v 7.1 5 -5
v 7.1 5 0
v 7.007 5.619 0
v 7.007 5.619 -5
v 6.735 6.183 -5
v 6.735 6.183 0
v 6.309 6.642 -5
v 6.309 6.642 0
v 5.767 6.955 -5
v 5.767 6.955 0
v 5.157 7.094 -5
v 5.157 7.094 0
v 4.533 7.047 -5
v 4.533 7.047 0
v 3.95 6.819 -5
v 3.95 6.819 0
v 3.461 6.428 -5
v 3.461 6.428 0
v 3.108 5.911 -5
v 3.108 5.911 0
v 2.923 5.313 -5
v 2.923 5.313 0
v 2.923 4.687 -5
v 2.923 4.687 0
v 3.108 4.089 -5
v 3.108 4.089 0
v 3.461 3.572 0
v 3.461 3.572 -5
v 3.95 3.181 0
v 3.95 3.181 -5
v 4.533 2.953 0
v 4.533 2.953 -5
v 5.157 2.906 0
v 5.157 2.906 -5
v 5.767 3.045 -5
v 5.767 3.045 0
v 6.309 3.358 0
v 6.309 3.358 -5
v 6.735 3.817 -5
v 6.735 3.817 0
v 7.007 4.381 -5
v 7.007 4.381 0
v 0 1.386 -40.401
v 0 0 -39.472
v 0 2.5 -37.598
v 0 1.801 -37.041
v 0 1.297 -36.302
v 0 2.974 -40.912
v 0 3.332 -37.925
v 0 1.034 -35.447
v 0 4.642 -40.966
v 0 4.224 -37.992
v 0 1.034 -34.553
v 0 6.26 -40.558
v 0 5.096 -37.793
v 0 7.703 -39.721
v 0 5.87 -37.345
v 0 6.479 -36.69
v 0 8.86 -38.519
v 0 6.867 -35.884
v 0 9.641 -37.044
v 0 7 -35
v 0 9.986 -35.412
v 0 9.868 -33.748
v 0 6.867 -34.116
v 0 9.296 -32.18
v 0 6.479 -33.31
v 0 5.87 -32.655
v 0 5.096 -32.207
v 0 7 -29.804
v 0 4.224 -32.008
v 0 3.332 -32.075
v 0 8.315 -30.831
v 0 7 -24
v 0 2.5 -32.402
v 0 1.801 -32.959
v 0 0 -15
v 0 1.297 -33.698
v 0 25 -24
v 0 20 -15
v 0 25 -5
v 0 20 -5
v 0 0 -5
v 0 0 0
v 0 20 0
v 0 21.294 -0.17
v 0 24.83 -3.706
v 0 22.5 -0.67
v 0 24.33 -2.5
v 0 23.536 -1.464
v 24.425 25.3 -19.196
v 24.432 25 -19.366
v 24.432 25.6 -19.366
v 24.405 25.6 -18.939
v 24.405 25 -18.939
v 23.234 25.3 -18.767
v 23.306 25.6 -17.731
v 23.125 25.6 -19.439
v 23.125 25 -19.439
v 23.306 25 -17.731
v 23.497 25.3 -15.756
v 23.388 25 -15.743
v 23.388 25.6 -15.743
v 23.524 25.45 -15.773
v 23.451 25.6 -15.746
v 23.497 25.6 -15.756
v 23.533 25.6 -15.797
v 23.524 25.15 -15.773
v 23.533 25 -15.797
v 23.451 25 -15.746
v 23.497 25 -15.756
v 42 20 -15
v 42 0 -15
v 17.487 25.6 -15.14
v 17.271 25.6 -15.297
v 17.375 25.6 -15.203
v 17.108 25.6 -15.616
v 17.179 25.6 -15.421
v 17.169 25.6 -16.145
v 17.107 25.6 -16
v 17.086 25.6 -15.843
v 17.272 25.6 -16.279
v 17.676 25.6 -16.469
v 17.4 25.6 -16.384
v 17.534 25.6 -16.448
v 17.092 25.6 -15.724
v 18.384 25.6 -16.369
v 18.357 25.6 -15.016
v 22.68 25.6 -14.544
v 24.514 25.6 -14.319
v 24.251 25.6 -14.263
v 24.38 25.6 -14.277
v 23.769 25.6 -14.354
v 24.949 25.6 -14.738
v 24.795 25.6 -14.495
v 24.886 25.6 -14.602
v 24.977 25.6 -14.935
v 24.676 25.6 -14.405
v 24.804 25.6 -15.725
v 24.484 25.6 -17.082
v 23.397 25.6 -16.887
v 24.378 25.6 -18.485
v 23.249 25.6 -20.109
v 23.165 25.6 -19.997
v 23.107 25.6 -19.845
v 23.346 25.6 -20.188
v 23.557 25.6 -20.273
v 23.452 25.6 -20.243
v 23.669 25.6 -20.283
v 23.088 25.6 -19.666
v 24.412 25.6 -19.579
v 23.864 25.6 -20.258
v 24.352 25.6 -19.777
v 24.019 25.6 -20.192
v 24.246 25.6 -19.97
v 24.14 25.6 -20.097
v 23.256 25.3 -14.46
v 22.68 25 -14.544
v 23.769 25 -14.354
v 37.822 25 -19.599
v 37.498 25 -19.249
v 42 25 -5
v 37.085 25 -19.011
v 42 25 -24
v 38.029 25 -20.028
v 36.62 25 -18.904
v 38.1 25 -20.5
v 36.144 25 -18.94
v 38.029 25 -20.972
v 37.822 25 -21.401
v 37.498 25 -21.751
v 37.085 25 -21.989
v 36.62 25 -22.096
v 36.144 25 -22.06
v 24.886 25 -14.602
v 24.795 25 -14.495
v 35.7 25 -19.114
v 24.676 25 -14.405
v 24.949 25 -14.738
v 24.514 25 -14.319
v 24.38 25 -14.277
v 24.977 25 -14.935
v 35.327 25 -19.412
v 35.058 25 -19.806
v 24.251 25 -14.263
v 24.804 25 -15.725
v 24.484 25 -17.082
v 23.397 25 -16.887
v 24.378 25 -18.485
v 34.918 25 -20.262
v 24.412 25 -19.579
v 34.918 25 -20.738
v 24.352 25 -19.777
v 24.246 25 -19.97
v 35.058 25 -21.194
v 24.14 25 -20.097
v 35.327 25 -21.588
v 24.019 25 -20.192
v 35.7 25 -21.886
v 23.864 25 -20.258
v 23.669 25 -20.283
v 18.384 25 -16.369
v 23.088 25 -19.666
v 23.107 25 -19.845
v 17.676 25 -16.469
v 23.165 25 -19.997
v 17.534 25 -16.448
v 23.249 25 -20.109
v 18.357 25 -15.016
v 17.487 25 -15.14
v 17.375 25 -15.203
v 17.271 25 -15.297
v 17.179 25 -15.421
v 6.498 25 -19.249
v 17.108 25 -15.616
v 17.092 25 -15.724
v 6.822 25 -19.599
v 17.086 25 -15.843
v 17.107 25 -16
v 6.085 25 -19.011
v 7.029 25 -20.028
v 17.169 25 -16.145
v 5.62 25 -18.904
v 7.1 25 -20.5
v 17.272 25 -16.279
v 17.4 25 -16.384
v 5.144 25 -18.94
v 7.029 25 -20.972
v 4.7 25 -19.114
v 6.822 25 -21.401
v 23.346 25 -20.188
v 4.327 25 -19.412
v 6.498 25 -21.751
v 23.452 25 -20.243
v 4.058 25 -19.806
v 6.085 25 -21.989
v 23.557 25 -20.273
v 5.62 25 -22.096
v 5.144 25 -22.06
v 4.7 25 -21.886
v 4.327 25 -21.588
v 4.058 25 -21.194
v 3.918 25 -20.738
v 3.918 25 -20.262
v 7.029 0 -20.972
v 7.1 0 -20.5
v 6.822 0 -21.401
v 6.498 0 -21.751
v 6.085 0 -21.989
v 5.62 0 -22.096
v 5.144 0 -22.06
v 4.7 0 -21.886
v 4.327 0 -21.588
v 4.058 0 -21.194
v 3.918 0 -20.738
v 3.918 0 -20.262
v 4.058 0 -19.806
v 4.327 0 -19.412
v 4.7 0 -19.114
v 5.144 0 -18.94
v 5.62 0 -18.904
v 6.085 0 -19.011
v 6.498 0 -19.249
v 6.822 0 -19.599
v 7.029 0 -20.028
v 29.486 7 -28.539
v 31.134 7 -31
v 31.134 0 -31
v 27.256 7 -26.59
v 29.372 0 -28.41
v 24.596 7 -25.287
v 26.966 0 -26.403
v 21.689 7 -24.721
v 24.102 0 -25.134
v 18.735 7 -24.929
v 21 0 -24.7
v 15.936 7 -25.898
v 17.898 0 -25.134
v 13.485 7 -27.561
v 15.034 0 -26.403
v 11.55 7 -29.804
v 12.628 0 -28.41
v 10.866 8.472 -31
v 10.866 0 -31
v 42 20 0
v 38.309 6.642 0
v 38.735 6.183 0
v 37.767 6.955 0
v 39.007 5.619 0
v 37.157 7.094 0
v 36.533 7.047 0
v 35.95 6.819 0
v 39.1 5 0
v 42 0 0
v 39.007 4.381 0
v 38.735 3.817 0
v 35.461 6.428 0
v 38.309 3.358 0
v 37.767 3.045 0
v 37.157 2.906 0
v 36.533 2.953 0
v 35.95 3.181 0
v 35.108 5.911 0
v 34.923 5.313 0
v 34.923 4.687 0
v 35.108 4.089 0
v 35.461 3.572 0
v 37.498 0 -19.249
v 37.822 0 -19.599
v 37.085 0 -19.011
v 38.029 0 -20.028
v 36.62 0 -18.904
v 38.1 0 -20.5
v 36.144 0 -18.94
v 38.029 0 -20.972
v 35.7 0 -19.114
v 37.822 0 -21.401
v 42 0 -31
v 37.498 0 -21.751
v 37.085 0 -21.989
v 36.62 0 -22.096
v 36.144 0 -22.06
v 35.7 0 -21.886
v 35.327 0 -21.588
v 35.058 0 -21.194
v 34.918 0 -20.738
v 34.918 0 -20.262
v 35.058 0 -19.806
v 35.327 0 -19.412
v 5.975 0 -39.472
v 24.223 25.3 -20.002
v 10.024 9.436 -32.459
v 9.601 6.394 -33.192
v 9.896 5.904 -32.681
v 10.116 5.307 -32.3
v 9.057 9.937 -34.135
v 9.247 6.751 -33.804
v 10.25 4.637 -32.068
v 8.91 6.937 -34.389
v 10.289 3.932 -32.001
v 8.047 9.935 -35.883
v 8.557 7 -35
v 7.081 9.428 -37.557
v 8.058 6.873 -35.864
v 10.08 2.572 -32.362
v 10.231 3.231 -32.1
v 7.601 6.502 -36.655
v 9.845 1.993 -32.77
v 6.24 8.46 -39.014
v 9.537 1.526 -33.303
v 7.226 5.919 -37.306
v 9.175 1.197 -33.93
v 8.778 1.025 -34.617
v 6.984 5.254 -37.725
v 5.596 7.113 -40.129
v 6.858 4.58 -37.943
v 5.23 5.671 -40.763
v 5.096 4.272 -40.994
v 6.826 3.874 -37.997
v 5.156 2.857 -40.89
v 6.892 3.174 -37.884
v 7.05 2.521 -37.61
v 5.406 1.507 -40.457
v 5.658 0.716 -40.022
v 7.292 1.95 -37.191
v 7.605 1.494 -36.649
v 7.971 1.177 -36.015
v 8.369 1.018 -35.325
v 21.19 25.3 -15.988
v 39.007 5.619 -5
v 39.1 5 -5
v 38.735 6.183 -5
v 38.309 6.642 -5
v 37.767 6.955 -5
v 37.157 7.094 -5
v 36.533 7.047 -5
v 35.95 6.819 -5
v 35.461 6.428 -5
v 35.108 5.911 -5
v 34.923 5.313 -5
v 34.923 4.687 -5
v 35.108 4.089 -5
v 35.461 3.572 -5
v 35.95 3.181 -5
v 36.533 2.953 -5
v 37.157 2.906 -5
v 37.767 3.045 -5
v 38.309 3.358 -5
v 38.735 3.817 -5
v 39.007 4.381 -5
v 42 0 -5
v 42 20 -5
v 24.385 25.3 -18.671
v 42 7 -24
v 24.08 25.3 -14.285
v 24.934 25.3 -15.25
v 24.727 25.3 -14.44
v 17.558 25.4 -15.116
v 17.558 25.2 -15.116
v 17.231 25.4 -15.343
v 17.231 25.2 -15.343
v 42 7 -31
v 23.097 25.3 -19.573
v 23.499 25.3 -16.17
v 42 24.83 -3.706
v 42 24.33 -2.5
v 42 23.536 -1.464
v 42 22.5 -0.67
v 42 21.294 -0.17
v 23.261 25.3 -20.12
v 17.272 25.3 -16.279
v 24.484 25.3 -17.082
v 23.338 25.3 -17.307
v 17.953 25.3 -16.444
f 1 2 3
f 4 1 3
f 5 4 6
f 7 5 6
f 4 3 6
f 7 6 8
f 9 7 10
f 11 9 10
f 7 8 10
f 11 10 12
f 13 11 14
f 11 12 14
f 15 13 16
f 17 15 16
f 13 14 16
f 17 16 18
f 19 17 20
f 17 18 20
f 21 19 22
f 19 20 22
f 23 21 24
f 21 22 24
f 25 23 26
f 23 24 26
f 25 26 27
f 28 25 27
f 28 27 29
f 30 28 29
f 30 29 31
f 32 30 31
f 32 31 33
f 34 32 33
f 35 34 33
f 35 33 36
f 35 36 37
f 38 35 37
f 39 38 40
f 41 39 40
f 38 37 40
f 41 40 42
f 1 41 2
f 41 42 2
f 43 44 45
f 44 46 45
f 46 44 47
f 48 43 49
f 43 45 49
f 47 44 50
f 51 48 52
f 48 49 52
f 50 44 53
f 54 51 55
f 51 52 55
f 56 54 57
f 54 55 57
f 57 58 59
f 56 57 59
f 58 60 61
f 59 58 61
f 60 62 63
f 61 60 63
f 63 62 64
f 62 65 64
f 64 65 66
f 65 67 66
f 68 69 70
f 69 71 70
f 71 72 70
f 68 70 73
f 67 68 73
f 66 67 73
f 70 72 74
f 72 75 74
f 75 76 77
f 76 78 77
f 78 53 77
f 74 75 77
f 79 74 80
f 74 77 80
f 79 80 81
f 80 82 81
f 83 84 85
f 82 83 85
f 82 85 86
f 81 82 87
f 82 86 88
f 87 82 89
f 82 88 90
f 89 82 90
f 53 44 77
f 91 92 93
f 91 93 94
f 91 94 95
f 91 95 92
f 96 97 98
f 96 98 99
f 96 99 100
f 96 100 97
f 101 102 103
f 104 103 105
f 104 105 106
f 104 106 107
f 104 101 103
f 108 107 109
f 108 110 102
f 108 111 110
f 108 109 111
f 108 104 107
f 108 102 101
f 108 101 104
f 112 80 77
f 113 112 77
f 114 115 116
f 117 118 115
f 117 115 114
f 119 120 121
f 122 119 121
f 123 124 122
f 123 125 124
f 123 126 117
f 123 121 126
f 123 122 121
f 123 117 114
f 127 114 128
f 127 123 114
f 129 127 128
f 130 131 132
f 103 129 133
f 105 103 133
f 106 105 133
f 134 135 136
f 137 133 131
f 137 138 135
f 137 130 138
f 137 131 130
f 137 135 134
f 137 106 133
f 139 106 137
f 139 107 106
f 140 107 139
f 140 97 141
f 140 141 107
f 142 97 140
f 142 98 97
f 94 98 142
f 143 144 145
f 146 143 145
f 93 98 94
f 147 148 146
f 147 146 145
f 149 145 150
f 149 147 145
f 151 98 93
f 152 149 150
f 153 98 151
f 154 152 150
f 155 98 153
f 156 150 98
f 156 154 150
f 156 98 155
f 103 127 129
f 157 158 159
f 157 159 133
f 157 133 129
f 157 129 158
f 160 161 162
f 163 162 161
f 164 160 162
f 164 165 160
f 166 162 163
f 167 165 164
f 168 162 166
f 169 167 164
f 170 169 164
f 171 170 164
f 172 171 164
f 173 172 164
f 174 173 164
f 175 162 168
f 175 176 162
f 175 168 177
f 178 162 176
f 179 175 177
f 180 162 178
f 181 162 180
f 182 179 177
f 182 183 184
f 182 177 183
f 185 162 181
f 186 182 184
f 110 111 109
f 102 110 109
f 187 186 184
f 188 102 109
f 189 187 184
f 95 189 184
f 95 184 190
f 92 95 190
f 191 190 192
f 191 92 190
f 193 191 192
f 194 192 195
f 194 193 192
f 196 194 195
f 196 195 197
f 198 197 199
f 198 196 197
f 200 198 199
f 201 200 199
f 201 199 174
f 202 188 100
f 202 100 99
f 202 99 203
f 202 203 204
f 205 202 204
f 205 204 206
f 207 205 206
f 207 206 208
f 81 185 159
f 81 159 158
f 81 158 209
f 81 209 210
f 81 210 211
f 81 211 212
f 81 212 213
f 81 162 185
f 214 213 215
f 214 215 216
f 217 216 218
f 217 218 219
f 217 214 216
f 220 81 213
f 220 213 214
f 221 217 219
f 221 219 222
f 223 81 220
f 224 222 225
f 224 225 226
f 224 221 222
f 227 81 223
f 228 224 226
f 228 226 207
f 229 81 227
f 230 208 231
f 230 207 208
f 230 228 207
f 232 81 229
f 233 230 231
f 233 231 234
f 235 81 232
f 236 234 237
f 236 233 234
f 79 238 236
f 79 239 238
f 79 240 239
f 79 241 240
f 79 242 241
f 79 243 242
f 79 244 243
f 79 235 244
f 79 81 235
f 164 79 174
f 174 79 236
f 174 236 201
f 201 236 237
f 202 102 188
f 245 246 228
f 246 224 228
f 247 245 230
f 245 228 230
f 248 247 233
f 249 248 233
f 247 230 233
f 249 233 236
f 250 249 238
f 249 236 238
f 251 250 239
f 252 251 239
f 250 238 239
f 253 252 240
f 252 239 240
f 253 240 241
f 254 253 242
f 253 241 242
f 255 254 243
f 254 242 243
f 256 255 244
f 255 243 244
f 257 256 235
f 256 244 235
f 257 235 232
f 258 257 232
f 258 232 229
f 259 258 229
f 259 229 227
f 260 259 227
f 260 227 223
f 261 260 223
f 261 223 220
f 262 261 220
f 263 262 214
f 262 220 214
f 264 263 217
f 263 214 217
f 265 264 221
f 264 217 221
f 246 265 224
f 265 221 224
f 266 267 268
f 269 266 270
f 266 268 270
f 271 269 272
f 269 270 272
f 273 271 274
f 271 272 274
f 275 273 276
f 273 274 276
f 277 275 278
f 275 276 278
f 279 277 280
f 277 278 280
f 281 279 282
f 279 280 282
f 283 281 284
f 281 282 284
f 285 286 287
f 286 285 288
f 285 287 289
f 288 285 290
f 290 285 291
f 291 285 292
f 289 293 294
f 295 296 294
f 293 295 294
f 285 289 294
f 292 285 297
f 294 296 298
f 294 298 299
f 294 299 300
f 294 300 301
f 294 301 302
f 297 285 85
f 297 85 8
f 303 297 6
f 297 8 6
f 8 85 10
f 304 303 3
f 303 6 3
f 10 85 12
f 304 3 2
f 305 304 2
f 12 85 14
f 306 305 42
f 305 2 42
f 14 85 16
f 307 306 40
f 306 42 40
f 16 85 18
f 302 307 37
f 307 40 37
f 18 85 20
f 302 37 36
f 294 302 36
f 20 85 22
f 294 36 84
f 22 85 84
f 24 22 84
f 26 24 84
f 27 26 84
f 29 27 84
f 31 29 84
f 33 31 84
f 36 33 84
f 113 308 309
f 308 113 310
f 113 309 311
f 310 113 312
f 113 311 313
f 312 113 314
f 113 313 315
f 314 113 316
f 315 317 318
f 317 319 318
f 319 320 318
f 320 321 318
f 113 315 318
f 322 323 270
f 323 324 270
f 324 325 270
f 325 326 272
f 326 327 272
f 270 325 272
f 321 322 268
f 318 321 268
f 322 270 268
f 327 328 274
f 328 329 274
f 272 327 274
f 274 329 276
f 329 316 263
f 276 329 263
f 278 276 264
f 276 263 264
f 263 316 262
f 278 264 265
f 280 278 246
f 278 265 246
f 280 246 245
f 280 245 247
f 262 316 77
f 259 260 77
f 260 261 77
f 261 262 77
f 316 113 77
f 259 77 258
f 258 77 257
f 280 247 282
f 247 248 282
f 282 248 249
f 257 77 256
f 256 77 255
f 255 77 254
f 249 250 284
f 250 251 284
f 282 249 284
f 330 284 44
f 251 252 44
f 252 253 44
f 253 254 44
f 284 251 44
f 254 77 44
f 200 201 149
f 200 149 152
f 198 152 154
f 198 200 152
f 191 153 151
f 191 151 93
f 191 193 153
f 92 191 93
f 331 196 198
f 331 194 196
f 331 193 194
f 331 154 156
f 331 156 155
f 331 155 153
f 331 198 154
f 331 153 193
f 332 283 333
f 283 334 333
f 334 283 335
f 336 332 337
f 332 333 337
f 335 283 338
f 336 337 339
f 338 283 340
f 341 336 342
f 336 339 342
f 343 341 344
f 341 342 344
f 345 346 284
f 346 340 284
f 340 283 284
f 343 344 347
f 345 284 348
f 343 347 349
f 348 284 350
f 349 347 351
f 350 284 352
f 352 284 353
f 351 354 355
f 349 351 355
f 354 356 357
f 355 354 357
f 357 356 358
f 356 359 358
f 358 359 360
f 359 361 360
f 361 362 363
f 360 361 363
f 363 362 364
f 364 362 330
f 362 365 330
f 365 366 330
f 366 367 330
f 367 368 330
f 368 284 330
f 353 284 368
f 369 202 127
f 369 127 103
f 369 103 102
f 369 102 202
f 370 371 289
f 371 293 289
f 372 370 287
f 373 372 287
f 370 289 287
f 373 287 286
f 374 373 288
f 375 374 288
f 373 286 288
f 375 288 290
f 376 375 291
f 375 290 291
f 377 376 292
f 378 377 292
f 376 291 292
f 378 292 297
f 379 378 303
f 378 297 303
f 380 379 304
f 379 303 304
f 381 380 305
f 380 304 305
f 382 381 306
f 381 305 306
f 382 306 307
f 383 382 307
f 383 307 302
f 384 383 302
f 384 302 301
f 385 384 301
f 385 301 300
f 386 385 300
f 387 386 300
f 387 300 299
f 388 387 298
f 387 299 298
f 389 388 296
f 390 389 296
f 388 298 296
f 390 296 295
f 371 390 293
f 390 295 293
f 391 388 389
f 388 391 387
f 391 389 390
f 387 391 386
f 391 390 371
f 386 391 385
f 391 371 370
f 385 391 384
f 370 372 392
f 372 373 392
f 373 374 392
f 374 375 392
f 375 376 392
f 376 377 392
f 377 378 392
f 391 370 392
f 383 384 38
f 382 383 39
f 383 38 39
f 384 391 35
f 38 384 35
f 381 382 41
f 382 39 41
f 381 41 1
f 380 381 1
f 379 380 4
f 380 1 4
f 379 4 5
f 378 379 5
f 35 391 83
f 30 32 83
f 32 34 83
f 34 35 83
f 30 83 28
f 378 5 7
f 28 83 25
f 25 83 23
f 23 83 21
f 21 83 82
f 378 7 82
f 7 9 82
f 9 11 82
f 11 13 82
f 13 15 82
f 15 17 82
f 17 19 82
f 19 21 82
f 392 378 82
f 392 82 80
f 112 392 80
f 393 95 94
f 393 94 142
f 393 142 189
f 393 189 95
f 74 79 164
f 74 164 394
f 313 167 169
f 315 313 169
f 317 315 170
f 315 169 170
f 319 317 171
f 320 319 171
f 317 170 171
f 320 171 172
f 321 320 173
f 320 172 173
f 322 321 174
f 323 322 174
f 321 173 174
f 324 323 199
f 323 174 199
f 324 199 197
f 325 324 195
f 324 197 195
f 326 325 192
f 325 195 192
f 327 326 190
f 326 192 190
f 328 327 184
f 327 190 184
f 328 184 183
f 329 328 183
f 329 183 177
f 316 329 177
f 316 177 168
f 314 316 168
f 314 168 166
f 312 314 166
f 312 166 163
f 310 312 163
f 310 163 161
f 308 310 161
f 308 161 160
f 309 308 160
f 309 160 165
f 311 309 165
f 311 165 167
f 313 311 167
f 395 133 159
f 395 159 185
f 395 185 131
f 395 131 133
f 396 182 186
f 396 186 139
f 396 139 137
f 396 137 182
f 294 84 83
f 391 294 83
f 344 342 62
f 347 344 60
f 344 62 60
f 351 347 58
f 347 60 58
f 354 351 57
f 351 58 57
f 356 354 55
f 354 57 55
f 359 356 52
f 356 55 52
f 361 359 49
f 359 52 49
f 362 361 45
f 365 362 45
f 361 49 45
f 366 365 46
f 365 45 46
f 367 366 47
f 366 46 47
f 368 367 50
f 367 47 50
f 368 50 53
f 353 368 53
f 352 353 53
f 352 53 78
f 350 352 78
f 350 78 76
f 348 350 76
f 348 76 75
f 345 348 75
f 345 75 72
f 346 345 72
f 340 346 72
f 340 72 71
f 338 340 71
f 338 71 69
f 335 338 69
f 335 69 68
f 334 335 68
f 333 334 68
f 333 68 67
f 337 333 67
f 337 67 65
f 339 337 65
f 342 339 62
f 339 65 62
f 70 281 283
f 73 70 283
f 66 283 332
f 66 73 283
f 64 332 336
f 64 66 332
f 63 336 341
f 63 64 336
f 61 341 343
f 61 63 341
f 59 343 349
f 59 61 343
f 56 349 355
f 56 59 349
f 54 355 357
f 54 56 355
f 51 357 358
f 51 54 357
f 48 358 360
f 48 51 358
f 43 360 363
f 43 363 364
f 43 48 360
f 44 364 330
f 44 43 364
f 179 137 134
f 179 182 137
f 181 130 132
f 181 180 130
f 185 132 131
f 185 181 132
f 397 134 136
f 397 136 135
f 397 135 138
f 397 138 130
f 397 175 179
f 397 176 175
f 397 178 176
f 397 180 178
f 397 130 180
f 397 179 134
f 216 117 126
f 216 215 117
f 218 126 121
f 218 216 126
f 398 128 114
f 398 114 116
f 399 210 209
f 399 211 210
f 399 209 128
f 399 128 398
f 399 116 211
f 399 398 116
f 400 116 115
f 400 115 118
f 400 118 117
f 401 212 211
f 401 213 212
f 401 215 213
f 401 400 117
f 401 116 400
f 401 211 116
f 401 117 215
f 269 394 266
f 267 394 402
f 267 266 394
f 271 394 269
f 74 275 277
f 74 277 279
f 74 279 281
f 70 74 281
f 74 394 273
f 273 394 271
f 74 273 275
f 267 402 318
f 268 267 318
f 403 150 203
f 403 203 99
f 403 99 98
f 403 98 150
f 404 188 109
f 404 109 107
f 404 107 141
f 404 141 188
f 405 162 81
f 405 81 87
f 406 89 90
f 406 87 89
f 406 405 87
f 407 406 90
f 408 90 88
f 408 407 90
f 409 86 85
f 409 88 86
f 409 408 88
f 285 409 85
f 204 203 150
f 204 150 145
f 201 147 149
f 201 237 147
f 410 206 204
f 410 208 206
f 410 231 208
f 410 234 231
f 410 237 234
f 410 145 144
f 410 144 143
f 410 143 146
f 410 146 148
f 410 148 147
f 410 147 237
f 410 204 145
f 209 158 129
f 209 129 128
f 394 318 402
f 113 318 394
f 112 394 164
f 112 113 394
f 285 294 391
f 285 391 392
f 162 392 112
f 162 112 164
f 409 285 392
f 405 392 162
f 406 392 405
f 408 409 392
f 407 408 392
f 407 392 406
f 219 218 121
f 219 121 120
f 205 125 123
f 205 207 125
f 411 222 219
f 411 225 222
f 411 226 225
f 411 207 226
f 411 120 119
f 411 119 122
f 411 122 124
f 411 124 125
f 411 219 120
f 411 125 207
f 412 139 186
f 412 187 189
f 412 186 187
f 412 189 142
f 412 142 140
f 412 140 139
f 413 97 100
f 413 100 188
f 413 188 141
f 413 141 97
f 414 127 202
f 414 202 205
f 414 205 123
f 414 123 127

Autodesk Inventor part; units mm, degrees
ref_plane "YZ Plane" through (0, 0, 0) normal (1, 0, 0) x (0, 1, 0)
ref_plane "XZ Plane" through (0, 0, 0) normal (0, 1, 0) x (-1, 0, 0)
ref_plane "XY Plane" through (0, 0, 0) normal (0, 0, 1) x (1, 0, 0)
sketch "Sketch1" plane through (0, 0, 0) normal (1, 0, 0) x (0, 1, 0)
  line L0 (0, 0) -> (0, -5)
  line L1 (0, -5) -> (20, -5)
  line L2 (20, -5) -> (20, -15)
  line L3 (20, -15) -> (0, -15)
  line L4 (0, -15) -> (0, -39.4721)
  line L5 (25, 0) -> (25, -24)
  line L6 (25, -24) -> (7, -24)
  line L7 (7, -24) -> (7, -29.8038)
  line L8 (25, 0) -> (0, 0)
  circle A0 centre (4, -35) radius 3
  arc A1 (0, -39.4721) -> (7, -29.8038) centre (4, -35) ccw
  dimension "d0" = 5
  dimension "d1" = 20
  dimension "d2" = 10
  dimension "d5" = 5
  dimension "d6" = 7
  dimension "d7" = 6
  dimension "d8" = 20
  dimension "d9" = 4
  dimension "d10" = 6
  dimension "d45" = 9
extrude "Extrusion1" add sketch "Sketch1" along normal blind 42
fillet "Fillet1" radius 5 1 edges at (21, 25, 0)
sketch "Sketch2" plane through (0, 7, -24) normal (0, 1, 0) x (1, 0, 0)
  arc A0 (10.8664, 7) -> (31.1336, 7) centre (21, 12) ccw
  line L0 (0, 0) -> (42, 0) projected
  line L1 (10.8664, 7) -> (3.3664, 19.9904)
  line L2 (10.8664, 7) -> (25.8664, 7) construction
  line L3 (31.1336, 7) -> (38.6336, 19.9904)
  line L4 (31.1336, 7) -> (46.1336, 7) construction
  line L5 (38.6336, 19.9904) -> (3.3664, 19.9904)
  line L6 (0, 0) -> (42, 0) projected
  point P0 (0, -24)
  point P1 (21, 0)
  dimension "d14" = 11.3
  dimension "d15" = 12
  dimension "d16" = 7
  dimension "d17" = 15
  dimension "d18" = 120
  dimension "d19" = 15
  dimension "d20" = 60
extrude "Extrusion2" cut sketch "Sketch2" along normal through all both and the other way through all
sketch "Sketch3" plane through (42, 0, 0) normal (1, 0, 0) x (0, 0, -1)
  line L0 (29, 7) -> (31, 7)
  line L1 (31, 7) -> (31, 0)
  line L2 (31, 0) -> (43, 0)
  line L3 (43, 0) -> (43, 12)
  line L4 (43, 12) -> (29, 12)
  line L5 (29, 12) -> (29, 7)
  line L6 (15, 20) -> (15, 0) projected
  point P0 (0, 0)
  dimension "d23" = 7
  dimension "d24" = 16
  dimension "d25" = 2
  dimension "d26" = 12
  dimension "d27" = 14
extrude "Extrusion3" cut sketch "Sketch3" against normal up to surface
sketch "Sketch4" plane through (0, 25, -24) normal (0, 1, 0) x (1, 0, 0)
  circle A0 centre (5.5, -3.5) radius 1.6
  circle A1 centre (36.5, -3.5) radius 1.6
  line L0 (0, 0) -> (0, -19) projected
  line L1 (42, 0) -> (42, -19) projected
  line L2 (0, 0) -> (42, 0) projected
  point P0 (0, -24)
  dimension "d30" = 3.2
  dimension "d31" = 5.5
  dimension "d32" = 5.5
  dimension "d33" = 3.5
  dimension "d34" = 3.5
extrude "Extrusion4" cut sketch "Sketch4" against normal through all
sketch "Sketch5" plane through (0, 0, 0) normal (0, 0, 1) x (1, 0, 0)
  circle A0 centre (5, 5) radius 2.1
  circle A1 centre (37, 5) radius 2.1
  line L0 (0, 0) -> (42, 0) projected
  line L1 (0, 20) -> (0, 0) projected
  line L2 (42, 20) -> (42, 0) projected
  dimension "d37" = 4.2
  dimension "d38" = 5
  dimension "d39" = 5
  dimension "d40" = 5
extrude "Extrusion5" cut sketch "Sketch5" against normal up to next
sketch "Sketch6" plane through (0, 25, -24) normal (0, 1, 0) x (1, 0, 0)
  spline S0 degree 2 poles (24.4322, -4.6341) (24.4322, -4.7612) (24.4049, -5.0608) knots 0 0 0 1 1 1
  spline S1 degree 2 poles (24.4049, -5.0608) (24.3777, -5.3696) (24.3777, -5.5149) knots 0 0 0 1 1 1
  spline S2 degree 2 poles (24.3777, -5.5149) (24.3777, -6.9405) (24.8045, -8.2754) knots 0 0 0 1 1 1
  spline S3 degree 2 poles (24.8045, -8.2754) (24.977, -8.8293) (24.977, -9.0654) knots 0 0 0 1 1 1
  spline S4 degree 2 poles (24.977, -9.0654) (24.977, -9.3832) (24.4776, -9.7374) (24.2506, -9.7374) knots 0 0 0 1 2 2 2
  spline S5 degree 2 poles (24.2506, -9.7374) (24.1507, -9.7374) (23.7693, -9.6465) knots 0 0 0 1 1 1
  spline S6 degree 2 poles (23.7693, -9.6465) (23.288, -9.5285) (22.6796, -9.4559) knots 0 0 0 1 1 1
  line L0 (22.6796, -9.4559) -> (18.3573, -8.9837)
  spline S7 degree 2 poles (18.3573, -8.9837) (17.7398, -8.9292) (17.3766, -8.8384) (17.086, -8.4752) (17.086, -8.1573) knots 0 0 0 1 2 3 3 3
  spline S8 degree 2 poles (17.086, -8.1573) (17.086, -7.9122) (17.4583, -7.5308) (17.6762, -7.5308) knots 0 0 0 1 2 2 2
  spline S9 degree 2 poles (17.6762, -7.5308) (17.876, -7.5308) (18.3845, -7.6307) knots 0 0 0 1 1 1
  spline S10 degree 2 poles (18.3845, -7.6307) (19.12, -7.7669) (23.2608, -8.2572) (23.3879, -8.2572) knots 0 0 0 1 2 2 2
  spline S11 degree 2 poles (23.3879, -8.2572) (23.5332, -8.2572) (23.5332, -8.2027) knots 0 0 0 1 1 1
  spline S12 degree 2 poles (23.5332, -8.2027) (23.5332, -8.003) (23.397, -7.1131) knots 0 0 0 1 1 1
  spline S13 degree 2 poles (23.397, -7.1131) (23.3243, -6.6954) (23.3062, -6.2686) knots 0 0 0 1 1 1
  spline S14 degree 2 poles (23.3062, -6.2686) (23.2517, -5.0518) (23.1246, -4.5614) knots 0 0 0 1 1 1
  spline S15 degree 2 poles (23.1246, -4.5614) (23.0882, -4.407) (23.0882, -4.3344) knots 0 0 0 1 1 1
  spline S16 degree 2 poles (23.0882, -4.3344) (23.0882, -4.0438) (23.4333, -3.7169) (23.6694, -3.7169) knots 0 0 0 1 2 2 2
  spline S17 degree 2 poles (23.6694, -3.7169) (24.0145, -3.7169) (24.4322, -4.2799) (24.4322, -4.6341) knots 0 0 0 1 2 2 2
  point P0 (0, -24)
  point P1 (17.086, -10.4002)
extrude "Extrusion6" add sketch "Sketch6" along normal blind 0.6
equation "\"d32\" = d31"
equation "\"d40\" = d39"
properties material "ABS Plastic"
